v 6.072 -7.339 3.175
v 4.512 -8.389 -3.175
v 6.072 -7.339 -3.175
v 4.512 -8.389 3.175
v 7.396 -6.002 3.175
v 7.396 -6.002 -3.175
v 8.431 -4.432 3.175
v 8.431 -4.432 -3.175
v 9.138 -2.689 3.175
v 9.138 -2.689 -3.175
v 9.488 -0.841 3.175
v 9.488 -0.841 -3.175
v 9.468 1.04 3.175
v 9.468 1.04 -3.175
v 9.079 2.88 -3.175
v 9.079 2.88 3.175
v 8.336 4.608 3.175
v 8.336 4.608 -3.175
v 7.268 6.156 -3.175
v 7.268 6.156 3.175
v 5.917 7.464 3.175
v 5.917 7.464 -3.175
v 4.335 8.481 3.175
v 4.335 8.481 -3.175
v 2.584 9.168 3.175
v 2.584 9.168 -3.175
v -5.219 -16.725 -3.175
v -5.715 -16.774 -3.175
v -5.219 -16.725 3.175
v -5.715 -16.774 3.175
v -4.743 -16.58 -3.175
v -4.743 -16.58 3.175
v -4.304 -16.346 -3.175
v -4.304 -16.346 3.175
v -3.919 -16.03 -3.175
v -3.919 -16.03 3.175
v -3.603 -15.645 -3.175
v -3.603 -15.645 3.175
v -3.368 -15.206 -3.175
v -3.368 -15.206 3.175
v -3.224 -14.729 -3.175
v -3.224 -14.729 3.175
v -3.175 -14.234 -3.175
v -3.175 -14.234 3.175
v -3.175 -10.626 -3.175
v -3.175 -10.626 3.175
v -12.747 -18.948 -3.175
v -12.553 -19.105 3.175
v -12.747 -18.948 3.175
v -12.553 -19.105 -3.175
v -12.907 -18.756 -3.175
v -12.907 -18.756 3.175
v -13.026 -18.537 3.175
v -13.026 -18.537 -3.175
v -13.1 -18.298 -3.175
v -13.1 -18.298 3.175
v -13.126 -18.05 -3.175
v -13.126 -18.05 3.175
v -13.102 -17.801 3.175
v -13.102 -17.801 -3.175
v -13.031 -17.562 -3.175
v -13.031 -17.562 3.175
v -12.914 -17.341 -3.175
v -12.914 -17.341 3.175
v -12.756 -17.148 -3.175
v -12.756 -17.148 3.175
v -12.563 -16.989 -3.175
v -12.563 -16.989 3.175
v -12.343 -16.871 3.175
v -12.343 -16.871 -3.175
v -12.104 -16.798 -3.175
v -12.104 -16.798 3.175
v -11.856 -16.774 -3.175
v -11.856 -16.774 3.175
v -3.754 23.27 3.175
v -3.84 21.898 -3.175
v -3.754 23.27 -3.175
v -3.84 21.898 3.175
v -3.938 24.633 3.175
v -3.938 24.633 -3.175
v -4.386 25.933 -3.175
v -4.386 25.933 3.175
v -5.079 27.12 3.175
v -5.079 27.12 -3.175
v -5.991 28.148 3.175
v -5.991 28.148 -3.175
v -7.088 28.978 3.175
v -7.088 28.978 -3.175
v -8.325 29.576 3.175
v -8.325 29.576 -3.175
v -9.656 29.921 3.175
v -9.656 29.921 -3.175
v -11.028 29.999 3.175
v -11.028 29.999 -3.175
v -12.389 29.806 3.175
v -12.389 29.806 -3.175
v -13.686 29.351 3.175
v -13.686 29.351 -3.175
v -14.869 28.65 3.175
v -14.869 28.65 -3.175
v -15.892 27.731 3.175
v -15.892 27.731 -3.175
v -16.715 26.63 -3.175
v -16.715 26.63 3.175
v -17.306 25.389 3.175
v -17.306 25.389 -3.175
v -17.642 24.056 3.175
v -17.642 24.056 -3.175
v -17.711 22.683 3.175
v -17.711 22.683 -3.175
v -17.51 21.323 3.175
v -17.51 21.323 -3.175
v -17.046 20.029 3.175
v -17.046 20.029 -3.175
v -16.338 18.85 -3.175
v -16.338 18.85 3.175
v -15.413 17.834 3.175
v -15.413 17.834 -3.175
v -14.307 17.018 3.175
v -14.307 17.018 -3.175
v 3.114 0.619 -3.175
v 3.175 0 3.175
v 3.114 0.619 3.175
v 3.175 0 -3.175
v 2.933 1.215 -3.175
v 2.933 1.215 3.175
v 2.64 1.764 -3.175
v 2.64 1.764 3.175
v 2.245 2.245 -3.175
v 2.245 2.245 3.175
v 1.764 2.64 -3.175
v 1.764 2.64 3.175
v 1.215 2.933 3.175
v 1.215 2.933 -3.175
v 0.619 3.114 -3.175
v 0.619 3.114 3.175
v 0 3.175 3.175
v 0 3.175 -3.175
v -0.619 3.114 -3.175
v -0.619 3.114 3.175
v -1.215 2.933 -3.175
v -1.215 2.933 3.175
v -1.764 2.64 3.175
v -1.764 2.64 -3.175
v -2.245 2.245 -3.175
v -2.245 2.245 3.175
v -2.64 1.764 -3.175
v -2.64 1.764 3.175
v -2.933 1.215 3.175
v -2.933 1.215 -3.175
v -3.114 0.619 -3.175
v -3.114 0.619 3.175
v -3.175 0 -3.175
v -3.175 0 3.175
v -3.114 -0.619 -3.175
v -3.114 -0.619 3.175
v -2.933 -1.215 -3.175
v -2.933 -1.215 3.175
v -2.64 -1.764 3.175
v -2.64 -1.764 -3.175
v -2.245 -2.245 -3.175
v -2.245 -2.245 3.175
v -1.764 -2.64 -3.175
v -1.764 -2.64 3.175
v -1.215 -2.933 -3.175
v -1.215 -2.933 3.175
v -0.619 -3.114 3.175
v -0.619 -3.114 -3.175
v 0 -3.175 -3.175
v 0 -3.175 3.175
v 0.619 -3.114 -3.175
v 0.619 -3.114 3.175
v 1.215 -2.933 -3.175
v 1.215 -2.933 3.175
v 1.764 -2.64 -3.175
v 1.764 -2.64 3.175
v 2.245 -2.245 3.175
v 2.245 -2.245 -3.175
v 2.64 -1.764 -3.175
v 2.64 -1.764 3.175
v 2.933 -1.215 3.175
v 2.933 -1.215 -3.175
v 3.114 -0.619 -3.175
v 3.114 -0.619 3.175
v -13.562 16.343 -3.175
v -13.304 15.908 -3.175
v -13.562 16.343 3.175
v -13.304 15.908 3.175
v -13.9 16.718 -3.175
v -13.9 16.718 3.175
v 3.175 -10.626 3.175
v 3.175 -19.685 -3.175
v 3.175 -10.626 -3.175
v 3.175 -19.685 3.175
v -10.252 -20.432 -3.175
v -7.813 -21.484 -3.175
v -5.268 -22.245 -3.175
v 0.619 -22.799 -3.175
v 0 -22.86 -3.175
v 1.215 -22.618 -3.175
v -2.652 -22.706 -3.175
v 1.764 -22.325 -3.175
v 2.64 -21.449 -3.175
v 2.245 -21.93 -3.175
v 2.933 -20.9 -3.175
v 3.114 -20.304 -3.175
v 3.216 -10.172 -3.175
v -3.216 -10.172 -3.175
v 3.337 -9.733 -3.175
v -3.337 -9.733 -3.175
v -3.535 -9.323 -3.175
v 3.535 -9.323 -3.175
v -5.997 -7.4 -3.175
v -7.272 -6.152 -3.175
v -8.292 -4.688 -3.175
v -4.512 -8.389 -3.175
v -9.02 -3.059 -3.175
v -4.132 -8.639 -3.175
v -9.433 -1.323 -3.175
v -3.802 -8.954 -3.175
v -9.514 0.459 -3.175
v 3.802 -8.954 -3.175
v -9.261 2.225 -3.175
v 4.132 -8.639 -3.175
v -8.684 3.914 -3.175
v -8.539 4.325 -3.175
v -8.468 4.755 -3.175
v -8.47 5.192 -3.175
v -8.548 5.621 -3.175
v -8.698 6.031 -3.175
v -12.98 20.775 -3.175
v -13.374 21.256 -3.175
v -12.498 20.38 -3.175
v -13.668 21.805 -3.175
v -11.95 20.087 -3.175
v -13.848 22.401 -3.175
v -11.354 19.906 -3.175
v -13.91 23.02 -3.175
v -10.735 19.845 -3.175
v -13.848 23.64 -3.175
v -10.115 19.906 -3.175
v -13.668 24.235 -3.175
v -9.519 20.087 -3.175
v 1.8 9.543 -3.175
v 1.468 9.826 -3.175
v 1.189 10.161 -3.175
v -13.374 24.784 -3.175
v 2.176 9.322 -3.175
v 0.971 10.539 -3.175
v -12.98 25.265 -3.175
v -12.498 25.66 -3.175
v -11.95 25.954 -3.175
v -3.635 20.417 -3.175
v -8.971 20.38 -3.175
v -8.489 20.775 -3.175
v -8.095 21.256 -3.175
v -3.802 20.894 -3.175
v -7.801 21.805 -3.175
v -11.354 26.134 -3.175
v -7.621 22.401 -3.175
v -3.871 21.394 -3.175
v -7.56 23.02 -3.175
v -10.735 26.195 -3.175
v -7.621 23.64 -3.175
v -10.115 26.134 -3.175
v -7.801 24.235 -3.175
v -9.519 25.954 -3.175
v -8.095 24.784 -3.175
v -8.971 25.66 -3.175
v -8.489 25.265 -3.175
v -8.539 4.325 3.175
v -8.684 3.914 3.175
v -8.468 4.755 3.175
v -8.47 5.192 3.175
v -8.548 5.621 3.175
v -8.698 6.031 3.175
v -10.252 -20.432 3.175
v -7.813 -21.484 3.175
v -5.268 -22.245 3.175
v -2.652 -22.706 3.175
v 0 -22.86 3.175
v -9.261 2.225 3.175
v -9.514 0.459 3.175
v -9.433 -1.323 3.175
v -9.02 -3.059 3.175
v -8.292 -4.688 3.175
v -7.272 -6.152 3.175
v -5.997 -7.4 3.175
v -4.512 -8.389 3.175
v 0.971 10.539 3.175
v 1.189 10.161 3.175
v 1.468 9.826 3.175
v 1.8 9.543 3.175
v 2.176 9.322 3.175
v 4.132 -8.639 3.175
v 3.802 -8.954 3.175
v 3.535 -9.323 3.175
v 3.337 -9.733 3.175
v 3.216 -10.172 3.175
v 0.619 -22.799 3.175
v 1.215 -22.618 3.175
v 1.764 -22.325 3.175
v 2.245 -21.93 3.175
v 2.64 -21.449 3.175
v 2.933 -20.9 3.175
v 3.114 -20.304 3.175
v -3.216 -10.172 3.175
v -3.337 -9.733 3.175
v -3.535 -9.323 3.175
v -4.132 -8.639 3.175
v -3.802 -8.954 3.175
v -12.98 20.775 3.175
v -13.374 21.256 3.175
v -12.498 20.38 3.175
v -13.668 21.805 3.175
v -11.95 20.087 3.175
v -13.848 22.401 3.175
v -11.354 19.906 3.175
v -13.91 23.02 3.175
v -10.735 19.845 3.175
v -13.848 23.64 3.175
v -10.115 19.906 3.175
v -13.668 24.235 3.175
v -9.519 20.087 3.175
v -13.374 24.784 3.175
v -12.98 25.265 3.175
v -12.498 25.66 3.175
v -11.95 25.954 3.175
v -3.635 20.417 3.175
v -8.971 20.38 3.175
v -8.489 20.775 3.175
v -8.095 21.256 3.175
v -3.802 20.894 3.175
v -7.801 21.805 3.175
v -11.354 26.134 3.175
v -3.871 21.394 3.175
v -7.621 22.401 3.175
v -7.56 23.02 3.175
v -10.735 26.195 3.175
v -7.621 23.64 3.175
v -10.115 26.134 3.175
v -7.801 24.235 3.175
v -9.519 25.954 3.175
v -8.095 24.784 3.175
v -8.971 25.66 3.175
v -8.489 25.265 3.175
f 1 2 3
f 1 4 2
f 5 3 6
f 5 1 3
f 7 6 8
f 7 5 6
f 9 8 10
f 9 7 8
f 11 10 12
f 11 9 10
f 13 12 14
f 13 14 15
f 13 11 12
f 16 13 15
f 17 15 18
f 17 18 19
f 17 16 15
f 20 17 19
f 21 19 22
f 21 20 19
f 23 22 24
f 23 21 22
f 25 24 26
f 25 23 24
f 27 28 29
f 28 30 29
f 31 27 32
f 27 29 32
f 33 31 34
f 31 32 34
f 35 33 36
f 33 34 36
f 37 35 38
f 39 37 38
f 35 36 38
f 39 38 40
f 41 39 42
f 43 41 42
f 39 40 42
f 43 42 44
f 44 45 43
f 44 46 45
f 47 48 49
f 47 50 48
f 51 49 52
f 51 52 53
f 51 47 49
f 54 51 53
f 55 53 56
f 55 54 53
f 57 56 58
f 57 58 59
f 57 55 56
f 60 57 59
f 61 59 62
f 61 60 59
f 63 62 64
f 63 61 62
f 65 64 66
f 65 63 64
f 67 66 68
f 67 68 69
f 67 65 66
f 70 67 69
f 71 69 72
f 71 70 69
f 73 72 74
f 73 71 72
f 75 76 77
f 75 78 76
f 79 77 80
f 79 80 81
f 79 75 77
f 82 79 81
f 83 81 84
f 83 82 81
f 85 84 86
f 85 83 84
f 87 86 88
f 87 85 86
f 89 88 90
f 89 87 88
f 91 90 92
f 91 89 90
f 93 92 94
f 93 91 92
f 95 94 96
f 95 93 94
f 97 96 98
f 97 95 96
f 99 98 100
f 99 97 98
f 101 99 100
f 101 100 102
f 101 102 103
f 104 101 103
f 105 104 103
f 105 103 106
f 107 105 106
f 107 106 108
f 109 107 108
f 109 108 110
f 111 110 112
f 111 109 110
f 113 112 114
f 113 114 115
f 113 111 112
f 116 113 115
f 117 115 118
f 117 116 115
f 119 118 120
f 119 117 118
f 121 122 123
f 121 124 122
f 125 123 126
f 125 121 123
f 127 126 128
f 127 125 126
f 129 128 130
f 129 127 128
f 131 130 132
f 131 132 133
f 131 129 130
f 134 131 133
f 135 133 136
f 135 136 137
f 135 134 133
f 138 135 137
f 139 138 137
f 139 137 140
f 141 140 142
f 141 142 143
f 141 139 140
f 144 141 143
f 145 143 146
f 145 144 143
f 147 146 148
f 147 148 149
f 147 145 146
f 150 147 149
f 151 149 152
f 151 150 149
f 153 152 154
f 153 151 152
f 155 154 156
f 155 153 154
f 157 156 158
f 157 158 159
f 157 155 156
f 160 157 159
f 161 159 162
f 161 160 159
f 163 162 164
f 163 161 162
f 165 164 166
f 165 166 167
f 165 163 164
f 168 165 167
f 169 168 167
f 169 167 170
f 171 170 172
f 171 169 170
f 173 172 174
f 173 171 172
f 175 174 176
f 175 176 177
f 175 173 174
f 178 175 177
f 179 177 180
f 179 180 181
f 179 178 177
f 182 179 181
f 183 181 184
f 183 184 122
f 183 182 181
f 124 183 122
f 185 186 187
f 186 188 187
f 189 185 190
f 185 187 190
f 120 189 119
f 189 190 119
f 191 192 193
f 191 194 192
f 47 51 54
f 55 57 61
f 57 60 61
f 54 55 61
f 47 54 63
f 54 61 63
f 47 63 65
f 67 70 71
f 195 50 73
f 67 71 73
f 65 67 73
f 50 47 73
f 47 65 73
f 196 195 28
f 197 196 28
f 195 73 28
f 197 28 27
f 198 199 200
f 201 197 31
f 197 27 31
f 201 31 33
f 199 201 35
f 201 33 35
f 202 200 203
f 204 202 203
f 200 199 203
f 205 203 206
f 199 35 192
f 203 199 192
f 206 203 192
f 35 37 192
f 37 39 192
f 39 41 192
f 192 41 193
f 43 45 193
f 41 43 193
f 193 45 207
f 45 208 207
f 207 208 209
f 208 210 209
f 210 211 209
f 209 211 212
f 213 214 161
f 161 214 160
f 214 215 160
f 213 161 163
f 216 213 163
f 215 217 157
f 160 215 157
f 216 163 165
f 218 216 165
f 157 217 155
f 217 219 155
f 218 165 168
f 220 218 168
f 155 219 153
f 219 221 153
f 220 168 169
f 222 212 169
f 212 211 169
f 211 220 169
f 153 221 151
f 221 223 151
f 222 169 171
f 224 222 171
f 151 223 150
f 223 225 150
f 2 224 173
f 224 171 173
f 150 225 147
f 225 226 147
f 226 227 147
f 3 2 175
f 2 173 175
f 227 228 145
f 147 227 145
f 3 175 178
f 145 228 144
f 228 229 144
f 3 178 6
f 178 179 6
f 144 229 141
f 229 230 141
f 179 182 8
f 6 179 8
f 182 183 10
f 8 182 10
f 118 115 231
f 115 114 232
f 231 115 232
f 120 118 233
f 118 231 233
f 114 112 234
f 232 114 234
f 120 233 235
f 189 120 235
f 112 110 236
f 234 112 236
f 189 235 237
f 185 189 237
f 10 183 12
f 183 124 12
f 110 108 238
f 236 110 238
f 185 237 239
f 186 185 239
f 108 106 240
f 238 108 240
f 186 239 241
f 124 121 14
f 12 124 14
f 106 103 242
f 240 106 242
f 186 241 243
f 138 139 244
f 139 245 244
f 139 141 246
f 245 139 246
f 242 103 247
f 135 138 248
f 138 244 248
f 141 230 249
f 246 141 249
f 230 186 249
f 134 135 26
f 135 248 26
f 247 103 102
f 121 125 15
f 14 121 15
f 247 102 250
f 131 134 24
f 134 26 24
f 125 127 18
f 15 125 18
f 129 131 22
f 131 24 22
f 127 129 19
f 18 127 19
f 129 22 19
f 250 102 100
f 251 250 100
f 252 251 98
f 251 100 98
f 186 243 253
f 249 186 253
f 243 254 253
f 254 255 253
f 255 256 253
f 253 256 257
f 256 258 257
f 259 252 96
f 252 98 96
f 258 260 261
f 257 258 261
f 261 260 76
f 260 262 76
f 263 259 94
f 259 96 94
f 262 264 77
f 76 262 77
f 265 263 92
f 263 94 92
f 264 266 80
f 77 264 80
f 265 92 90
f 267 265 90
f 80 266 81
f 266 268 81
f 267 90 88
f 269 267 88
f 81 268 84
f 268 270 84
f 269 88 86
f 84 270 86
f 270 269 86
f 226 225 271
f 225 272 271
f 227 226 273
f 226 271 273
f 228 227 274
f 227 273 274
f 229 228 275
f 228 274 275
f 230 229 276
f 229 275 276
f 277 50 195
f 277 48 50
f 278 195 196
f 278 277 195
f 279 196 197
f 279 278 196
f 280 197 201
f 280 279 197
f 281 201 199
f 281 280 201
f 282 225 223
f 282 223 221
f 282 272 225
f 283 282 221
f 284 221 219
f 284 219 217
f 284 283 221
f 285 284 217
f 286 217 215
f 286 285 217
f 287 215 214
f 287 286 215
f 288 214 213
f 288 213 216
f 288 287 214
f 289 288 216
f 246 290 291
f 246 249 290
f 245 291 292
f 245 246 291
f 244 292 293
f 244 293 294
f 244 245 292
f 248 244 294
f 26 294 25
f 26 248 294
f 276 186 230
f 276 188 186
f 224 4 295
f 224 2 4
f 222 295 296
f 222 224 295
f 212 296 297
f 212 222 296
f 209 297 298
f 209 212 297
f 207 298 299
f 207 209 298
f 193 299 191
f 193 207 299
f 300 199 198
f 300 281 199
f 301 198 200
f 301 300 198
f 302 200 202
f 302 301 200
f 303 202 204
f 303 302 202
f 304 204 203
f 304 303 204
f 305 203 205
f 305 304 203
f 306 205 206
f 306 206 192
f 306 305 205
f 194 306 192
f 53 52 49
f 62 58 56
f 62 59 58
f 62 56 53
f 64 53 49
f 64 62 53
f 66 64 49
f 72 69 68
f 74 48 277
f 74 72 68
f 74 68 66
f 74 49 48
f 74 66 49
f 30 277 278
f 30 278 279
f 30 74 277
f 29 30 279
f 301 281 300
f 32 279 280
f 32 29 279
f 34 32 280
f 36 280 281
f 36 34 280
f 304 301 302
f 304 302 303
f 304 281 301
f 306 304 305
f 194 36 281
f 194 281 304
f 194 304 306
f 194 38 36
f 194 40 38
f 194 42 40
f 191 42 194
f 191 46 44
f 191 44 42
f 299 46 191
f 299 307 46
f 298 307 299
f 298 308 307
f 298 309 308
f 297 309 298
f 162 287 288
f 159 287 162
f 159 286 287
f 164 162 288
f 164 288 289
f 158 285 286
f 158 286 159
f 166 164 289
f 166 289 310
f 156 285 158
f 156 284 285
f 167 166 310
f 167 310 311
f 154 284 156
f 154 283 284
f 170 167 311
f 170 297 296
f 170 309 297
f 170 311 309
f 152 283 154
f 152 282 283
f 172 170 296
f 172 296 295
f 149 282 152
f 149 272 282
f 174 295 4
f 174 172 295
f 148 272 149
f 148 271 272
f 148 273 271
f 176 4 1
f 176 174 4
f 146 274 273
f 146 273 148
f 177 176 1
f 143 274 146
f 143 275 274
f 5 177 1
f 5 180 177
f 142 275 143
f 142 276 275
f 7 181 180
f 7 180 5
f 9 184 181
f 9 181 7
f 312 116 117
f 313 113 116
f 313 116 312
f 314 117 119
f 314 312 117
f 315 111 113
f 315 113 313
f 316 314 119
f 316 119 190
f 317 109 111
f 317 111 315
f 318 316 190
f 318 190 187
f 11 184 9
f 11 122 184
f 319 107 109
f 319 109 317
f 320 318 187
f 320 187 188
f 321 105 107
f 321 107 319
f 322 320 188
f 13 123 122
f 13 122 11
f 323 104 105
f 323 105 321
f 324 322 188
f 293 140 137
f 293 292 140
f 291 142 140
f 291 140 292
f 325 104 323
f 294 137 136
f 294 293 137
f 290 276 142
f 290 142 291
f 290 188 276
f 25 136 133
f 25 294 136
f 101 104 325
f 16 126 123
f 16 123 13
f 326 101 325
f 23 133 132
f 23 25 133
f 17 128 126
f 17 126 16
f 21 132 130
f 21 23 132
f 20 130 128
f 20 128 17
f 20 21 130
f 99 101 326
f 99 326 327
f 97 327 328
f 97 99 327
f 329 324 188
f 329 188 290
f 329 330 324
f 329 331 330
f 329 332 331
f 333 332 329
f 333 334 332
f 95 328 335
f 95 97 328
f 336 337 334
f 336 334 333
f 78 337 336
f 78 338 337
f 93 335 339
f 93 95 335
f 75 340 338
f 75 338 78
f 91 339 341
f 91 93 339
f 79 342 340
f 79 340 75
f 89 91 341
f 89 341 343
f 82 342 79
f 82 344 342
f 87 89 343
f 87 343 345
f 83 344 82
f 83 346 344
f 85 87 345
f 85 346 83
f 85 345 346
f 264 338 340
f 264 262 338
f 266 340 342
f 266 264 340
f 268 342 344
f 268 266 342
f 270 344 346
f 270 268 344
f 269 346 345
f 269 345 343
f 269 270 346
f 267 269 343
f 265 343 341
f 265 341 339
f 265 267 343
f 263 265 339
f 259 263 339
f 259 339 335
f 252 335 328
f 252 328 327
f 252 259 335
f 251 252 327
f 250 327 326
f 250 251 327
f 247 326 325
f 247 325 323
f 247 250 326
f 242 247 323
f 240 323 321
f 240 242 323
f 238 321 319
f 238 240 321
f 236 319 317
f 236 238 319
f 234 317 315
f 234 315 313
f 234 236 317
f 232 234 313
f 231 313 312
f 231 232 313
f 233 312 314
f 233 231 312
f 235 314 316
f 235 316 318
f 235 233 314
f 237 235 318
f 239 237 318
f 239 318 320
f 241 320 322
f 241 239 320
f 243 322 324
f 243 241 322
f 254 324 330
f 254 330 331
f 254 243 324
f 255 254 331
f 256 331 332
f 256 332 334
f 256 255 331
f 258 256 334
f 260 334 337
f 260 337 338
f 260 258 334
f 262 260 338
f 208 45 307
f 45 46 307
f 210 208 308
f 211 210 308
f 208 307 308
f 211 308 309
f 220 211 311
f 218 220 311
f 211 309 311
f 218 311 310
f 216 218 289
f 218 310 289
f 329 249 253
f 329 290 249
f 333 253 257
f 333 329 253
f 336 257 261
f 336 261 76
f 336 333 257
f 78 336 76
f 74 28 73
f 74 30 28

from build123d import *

# Parameters (mm, degrees)
SKETCH1_R           = 3.175
BOSS_EXTRUDE1_DEPTH = 3.175
FILLET1_R           = 2.54
FILLET2_R           = 1.27


with BuildPart() as part:
    # Sketch1 → Boss-Extrude1 (new, symmetric)
    with BuildSketch(Plane.XY):
        with BuildLine():
            Line((1.499199331, 9.406275903), (-3.9943168, 21.187159265))
            ThreePointArc((-3.9943168, 21.187159265), (-13.686492406, 29.350777683), (-13.662808272, 16.678667649))
            Line((-13.662808272, 16.678667649), (-8.169292141, 4.897784287))
            ThreePointArc((-8.169292141, 4.897784287), (-8.962323495, -3.225272479), (-3.175, -8.980256121))
            Line((-3.175, -8.980256121), (-3.175, -16.773611102))
            Line((-3.175, -16.773611102), (-15.531438137, -16.773611102))
            ThreePointArc((-15.531438137, -16.773611102), (-8.340708909, -21.284082665), (0, -22.86))
            ThreePointArc((0, -22.86), (2.24506403, -21.93006403), (3.175, -19.685))
            Line((3.175, -19.685), (3.175, -8.980256121))
            ThreePointArc((3.175, -8.980256121), (9.485682623, 0.864552013), (1.499199331, 9.406275903))
        make_face()
        with Locations((-10.734503848, 23.020217791)):
            Circle(SKETCH1_R, mode=Mode.SUBTRACT)
        Circle(SKETCH1_R, mode=Mode.SUBTRACT)
    extrude(amount=BOSS_EXTRUDE1_DEPTH, both=True)

    # Fillet1
    fillet1_edges = [part.edges().sort_by_distance(p)[0] for p in [
        (-3.175, -16.773611102, 0),
        (-3.175, -8.980256121, 0),
        (-8.169292141, 4.897784287, 0),
        (-13.662808272, 16.678667649, 0),
        (-3.9943168, 21.187159265, 0),
        (1.499199331, 9.406275903, 0),
        (3.175, -8.980256121, 0),
    ]]
    fillet(fillet1_edges, radius=FILLET1_R)

    # Fillet2
    fillet2_edges = [part.edges().sort_by_distance(p)[0] for p in [
        (-15.531438137, -16.773611102, 0),
    ]]
    fillet(fillet2_edges, radius=FILLET2_R)


solid = part.part
